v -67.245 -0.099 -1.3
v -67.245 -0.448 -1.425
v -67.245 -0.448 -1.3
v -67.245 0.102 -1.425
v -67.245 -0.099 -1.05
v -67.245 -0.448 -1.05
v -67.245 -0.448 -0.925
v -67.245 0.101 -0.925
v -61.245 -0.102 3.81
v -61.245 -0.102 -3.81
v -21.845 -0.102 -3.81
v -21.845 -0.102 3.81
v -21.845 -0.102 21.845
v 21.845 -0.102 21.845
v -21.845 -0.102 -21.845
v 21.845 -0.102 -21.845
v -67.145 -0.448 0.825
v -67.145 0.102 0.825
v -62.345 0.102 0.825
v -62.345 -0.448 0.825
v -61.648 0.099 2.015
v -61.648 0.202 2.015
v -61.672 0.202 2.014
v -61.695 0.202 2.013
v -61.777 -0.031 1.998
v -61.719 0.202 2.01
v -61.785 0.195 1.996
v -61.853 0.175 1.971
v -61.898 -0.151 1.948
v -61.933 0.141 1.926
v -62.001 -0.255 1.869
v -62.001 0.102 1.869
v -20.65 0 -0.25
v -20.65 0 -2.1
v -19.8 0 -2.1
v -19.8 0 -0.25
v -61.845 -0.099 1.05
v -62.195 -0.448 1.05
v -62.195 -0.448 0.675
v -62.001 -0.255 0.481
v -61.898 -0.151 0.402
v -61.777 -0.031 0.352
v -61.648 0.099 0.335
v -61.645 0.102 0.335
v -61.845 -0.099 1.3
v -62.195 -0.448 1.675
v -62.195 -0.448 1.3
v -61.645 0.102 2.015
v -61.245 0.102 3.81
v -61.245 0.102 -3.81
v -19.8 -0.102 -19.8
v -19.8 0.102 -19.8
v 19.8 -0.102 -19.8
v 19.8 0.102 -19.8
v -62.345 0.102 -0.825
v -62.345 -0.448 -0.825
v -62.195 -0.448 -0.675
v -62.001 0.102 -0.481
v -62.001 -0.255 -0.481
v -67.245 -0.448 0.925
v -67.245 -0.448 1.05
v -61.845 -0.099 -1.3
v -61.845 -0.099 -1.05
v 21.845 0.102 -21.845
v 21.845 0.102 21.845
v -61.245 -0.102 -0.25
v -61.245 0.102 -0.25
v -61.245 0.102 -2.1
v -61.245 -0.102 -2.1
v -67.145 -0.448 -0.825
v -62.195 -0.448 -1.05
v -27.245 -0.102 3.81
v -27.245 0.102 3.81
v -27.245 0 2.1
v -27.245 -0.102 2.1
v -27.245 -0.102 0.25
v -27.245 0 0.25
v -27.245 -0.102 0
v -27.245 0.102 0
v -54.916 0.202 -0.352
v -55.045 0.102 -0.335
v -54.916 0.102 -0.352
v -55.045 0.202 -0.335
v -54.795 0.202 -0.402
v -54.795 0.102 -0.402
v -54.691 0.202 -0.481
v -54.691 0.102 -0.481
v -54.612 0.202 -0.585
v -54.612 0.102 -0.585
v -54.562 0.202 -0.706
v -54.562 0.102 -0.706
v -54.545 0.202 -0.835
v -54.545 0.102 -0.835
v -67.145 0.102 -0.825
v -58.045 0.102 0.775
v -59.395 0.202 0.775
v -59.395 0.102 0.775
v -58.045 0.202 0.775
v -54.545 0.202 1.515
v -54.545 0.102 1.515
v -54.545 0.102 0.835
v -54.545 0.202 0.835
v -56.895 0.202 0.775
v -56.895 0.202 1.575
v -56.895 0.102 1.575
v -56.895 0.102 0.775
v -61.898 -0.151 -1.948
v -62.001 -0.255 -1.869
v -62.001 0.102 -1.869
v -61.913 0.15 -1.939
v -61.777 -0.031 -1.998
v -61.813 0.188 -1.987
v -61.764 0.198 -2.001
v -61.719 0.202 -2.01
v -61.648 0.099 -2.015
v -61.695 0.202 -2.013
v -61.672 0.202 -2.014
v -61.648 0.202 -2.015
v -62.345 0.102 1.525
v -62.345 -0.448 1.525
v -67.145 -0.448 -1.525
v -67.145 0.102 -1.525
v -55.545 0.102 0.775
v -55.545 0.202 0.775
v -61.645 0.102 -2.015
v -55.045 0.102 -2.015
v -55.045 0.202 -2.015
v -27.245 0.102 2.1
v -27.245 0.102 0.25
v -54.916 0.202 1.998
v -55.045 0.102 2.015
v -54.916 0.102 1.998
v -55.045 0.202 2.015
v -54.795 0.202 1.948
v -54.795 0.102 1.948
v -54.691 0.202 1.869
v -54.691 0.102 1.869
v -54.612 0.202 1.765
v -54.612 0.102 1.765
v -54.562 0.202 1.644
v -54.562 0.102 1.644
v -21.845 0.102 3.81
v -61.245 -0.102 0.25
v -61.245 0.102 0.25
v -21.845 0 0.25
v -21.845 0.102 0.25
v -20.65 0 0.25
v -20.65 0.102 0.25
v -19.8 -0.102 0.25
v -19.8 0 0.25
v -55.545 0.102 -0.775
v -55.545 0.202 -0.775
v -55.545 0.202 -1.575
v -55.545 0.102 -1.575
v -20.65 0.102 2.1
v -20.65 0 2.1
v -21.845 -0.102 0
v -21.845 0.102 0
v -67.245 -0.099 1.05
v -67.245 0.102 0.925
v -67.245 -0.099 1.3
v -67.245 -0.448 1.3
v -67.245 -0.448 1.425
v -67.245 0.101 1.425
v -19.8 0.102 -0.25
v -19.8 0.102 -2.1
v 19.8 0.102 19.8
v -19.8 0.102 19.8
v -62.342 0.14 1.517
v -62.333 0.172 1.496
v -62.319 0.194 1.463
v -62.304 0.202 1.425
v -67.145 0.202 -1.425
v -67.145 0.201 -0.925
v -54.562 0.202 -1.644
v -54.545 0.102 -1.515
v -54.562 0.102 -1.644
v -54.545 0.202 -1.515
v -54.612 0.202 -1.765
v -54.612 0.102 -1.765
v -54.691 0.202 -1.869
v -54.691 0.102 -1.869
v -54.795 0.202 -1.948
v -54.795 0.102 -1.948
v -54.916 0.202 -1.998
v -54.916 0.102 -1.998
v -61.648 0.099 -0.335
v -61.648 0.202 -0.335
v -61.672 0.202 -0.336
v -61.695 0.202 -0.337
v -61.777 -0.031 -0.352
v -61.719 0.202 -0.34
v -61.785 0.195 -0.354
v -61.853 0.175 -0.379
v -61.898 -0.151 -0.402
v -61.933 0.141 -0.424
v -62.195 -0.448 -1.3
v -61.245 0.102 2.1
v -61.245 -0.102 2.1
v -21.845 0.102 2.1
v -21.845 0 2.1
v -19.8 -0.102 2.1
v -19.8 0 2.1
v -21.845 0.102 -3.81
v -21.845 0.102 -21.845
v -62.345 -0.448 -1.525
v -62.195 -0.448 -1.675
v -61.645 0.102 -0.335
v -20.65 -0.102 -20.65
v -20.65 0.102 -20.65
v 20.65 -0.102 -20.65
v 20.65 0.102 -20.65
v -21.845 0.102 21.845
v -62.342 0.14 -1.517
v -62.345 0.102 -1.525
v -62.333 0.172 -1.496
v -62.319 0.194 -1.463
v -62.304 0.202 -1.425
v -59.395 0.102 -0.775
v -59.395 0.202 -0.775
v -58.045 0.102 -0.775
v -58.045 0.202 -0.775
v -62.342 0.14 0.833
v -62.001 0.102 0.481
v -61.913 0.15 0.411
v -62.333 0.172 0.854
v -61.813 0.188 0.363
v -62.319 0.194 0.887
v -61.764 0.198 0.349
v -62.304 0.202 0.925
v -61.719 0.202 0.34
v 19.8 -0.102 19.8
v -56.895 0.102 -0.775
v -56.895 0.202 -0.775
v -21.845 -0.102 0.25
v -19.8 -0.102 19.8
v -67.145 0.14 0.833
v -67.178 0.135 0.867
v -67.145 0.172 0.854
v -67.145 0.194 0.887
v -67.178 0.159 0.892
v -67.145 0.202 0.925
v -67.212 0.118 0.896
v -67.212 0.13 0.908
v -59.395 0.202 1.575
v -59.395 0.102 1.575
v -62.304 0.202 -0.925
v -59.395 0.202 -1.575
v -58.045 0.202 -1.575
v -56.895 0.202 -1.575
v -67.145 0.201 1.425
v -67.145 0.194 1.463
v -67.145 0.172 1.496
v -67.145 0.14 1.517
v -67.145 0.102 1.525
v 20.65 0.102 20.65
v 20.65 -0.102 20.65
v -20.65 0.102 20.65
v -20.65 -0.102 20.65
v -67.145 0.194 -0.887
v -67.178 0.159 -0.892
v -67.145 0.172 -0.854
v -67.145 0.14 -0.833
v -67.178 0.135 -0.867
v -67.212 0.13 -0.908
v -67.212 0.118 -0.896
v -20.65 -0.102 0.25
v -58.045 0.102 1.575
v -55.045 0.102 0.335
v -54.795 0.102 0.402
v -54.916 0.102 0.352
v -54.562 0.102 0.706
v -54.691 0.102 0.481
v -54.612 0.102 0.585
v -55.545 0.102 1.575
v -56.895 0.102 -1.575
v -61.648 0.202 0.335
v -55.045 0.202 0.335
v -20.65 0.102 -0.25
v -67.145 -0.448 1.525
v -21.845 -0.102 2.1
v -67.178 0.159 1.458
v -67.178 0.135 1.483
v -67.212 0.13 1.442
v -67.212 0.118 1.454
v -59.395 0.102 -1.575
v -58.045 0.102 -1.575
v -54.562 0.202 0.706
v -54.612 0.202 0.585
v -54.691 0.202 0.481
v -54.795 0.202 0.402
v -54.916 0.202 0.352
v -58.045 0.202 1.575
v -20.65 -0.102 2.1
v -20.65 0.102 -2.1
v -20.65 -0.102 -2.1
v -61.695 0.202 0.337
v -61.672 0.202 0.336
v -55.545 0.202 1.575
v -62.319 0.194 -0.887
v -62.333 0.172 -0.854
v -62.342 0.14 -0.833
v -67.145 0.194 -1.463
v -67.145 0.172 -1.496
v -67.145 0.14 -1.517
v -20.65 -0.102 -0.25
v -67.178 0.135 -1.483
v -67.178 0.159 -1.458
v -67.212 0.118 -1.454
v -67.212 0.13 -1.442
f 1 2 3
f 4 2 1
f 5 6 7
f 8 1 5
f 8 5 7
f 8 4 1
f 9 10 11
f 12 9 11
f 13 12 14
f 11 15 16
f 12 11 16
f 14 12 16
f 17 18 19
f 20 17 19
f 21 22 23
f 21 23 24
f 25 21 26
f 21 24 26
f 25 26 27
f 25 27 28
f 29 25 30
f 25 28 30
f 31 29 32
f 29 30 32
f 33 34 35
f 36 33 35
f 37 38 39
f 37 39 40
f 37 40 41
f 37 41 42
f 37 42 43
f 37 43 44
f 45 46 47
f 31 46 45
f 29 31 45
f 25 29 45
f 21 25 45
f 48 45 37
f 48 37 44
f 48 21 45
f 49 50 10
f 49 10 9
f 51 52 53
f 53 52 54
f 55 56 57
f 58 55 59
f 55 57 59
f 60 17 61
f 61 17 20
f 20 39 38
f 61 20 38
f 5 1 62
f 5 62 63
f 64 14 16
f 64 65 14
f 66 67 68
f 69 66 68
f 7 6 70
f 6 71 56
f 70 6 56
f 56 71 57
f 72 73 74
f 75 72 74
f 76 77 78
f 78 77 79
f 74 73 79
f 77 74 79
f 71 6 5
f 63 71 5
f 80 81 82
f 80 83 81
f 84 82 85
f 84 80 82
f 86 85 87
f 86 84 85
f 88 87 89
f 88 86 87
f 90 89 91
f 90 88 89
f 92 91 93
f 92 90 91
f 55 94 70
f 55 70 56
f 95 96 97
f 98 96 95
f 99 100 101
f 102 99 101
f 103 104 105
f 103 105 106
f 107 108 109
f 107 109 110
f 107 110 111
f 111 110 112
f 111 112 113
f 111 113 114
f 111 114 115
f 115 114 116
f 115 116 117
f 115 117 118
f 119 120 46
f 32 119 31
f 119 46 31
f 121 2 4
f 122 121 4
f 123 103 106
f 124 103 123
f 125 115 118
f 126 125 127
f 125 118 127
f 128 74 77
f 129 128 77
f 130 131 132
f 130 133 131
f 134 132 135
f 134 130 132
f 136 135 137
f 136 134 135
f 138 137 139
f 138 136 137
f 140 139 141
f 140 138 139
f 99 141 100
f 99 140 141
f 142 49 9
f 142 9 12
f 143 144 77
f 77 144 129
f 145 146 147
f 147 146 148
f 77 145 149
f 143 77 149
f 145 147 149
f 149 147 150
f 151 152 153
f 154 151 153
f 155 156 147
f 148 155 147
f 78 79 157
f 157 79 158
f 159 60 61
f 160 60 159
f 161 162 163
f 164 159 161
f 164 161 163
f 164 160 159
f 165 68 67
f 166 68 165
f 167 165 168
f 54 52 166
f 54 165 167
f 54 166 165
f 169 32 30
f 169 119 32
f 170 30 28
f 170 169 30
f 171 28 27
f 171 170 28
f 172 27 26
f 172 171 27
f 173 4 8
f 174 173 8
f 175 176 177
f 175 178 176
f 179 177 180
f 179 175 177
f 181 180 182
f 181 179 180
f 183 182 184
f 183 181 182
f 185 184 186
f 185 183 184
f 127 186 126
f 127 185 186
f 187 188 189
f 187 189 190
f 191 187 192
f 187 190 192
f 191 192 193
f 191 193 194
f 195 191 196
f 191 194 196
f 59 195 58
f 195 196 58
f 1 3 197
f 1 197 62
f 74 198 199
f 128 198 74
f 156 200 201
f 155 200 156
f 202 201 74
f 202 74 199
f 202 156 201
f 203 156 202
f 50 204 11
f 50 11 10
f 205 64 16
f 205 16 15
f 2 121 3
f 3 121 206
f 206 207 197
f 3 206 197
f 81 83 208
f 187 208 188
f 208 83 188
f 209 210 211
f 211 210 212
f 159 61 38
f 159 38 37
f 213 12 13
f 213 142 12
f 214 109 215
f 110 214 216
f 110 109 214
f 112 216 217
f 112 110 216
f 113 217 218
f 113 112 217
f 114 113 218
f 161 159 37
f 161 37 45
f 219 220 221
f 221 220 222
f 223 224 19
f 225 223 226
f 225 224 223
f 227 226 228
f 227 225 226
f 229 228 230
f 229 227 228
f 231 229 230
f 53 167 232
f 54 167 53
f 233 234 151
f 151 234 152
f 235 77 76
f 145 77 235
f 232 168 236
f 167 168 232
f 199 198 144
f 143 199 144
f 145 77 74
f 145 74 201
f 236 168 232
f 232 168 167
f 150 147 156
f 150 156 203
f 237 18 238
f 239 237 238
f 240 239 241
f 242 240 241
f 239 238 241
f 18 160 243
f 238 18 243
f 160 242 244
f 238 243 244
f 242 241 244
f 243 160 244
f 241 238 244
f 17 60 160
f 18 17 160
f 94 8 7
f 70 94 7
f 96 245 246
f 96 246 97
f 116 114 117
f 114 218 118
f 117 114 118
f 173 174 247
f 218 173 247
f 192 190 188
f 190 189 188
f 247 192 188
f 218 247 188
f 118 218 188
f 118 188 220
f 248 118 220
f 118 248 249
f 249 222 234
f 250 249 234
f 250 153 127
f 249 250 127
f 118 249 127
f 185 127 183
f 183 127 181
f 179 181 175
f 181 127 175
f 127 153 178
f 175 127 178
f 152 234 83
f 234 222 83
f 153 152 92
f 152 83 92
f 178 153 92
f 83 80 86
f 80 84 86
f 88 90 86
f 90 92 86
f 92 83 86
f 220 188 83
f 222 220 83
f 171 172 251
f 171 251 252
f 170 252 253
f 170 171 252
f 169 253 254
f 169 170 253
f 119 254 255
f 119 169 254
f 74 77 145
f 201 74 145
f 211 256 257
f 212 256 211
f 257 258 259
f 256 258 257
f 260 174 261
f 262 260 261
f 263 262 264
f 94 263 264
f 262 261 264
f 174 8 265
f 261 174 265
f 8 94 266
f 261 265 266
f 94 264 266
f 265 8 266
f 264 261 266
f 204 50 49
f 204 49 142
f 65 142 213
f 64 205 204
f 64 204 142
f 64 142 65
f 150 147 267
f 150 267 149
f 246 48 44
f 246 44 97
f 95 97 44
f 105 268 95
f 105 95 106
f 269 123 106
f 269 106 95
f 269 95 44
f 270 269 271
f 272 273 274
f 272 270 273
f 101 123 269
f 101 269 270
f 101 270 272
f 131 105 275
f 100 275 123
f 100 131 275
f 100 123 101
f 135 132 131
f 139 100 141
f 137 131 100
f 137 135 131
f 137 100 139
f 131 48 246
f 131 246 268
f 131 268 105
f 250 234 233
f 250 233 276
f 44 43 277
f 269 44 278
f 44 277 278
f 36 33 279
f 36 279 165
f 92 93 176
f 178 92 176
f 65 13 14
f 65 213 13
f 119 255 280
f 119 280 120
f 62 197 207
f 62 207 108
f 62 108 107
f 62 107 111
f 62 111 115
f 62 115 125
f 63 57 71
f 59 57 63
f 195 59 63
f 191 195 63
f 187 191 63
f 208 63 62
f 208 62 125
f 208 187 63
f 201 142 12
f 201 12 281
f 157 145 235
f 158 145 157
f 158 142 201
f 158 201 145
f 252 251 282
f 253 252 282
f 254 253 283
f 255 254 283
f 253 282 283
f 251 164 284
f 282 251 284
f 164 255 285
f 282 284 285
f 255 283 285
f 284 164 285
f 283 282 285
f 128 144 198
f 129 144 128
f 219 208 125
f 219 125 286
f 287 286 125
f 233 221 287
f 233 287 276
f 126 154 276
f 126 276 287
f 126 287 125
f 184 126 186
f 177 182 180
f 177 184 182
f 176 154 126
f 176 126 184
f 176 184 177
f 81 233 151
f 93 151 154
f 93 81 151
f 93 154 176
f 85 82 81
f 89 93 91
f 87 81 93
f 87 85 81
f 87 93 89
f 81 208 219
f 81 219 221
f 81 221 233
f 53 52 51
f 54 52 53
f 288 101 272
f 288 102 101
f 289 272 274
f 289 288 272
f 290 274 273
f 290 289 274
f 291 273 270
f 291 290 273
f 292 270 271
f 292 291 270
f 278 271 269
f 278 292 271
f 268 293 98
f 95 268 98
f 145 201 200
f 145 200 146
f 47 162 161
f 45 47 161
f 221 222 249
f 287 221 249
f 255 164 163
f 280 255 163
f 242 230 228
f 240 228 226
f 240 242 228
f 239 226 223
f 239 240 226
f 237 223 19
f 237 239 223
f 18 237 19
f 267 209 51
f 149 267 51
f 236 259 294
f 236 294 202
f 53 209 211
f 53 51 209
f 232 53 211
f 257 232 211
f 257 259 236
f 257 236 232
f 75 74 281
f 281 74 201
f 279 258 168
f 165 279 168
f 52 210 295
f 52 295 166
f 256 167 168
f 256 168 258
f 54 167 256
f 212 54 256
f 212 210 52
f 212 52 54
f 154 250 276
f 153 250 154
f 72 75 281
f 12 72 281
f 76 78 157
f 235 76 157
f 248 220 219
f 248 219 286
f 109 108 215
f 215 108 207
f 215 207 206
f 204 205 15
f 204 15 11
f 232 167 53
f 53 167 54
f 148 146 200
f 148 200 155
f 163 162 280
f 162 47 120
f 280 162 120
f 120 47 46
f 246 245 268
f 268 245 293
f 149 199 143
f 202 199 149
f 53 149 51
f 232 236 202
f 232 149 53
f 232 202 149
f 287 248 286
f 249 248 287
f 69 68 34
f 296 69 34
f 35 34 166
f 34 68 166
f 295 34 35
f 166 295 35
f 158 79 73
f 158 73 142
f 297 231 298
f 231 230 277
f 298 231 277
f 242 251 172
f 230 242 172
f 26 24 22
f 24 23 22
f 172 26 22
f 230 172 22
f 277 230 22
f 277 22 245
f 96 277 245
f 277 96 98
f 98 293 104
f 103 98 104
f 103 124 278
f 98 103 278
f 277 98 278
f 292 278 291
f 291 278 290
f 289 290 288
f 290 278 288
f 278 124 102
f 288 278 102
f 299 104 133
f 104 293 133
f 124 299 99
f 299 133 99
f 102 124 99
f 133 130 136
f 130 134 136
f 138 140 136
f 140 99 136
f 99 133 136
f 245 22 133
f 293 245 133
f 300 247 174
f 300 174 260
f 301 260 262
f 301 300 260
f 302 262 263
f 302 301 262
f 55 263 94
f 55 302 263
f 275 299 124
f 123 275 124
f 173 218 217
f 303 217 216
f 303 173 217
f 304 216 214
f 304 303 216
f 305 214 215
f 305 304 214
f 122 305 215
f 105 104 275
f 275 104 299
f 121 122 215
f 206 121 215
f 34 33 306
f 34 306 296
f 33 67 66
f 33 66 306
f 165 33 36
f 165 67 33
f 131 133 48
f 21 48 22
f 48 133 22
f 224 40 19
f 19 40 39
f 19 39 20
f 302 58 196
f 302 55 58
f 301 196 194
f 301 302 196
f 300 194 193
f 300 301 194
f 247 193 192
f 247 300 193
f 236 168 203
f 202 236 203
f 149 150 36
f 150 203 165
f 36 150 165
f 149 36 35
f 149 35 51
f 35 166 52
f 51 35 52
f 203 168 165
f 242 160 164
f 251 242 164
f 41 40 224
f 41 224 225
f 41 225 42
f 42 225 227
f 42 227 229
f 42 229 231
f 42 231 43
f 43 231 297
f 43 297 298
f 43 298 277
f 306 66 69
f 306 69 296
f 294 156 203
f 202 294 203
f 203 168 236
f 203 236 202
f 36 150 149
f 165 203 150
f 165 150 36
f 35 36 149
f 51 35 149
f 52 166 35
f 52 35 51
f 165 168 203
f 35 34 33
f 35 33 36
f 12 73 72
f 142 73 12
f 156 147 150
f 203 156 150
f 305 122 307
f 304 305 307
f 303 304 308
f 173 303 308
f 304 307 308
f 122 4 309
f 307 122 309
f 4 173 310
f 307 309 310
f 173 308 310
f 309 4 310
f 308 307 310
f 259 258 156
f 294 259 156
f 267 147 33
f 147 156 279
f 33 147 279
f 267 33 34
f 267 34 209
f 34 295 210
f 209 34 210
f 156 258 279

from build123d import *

# Parameters (mm, degrees)
BOSS_EXTRUDE1_DEPTH             = 0.1015
SKETCH4_W                       = 39.6
SKETCH4_H                       = 39.6
BOSS_EXTRUDE2_DEPTH             = 0.1015
BOSS_EXTRUDE4_REACH             = 67.024
SKETCH6_W                       = 41.445
SKETCH6_H                       = 1.85
BOSS_EXTRUDE4_DIRECTION_2_REACH = 67.024
BOSS_EXTRUDE3_REACH             = 67.024
SKETCH5_W                       = 41.3
SKETCH5_H                       = 41.3
SKETCH5_W_2                     = 39.6
SKETCH5_H_2                     = 39.6
BOSS_EXTRUDE3_DIRECTION_2_REACH = 67.024
SKETCH12_W                      = 0.85
SKETCH12_H                      = 1.85
CUT_EXTRUDE2_DEPTH              = 66.024336615
SKETCH12_2_W                    = 0.85
SKETCH12_2_H                    = 1.85
CUT_EXTRUDE7_DEPTH              = 66.024336615
SKETCH14_W                      = 0.85
SKETCH14_H                      = 1.85
CUT_EXTRUDE4_DEPTH              = 66.024336615
SKETCH14_2_W                    = 0.85
SKETCH14_2_H                    = 1.85
CUT_EXTRUDE8_DEPTH              = 66.024336615
BOSS_EXTRUDE5_DEPTH             = 0.1
SKETCH29_W                      = 5
SKETCH29_H                      = 0.7
BOSS_EXTRUDE6_DEPTH             = 0.55
CHAMFER1_SIZE                   = 0.6
CHAMFER2_SIZE                   = 0.6
SKETCH30_W                      = 0.25
SKETCH30_H                      = 0.35
CUT_EXTRUDE_THIN1_DEPTH         = 92.730220087
FILLET2_R                       = 0.1
CHAMFER3_SIZE                   = 0.1
FILLET4_R                       = 0.5
FILLET5_R                       = 0.5
SKETCH31_W                      = 1.35
SKETCH31_H                      = 0.8
CUT_EXTRUDE6_DEPTH              = 0.1
LPATTERN3_COUNT                 = 2
LPATTERN3_PITCH                 = 2.35
SKETCH32_W                      = 5.4
SKETCH32_H                      = 3.81
BOSS_EXTRUDE7_DEPTH             = 0.203
SKETCH33_W                      = 5.4
SKETCH33_H                      = 1.85
CUT_EXTRUDE9_DEPTH              = 71.70569427
SKETCH33_2_W                    = 5.4
SKETCH33_2_H                    = 1.85
CUT_EXTRUDE10_DEPTH             = 71.70569427


with BuildPart() as part:
    # Sketch3 → Boss-Extrude1 (new, symmetric)
    with BuildSketch(Plane(origin=(0, 0, 0), x_dir=(1, 0, 0), z_dir=(0, 1, 0))):
        Polygon((21.845, -21.845), (21.845, 21.845), (-21.845, 21.845), (-21.845, 3.81), (-54.745, 3.81), (-61.245, 3.81), (-61.245, -3.81), (-54.745, -3.81), (-21.845, -3.81), (-21.845, -21.845), align=None)
    extrude(amount=BOSS_EXTRUDE1_DEPTH, both=True)


with BuildPart() as body_2:
    # Sketch4 → Boss-Extrude2 (new, symmetric)
    with BuildSketch(Plane(origin=(0, 0, 0), x_dir=(1, 0, 0), z_dir=(0, 1, 0))):
        Rectangle(SKETCH4_W, SKETCH4_H)
    extrude(amount=BOSS_EXTRUDE2_DEPTH, both=True)


    # Boss-Extrude4: up to this face of the body (flat: up to its plane)
    boss_extrude4_end = Plane(part.part.faces().sort_by_distance((-5.646321076, 0.1015, 0))[0])
    # Sketch6 → Boss-Extrude4 (add, up to the picked face)
    with BuildSketch(Plane(origin=(0, 0, 0), x_dir=(1, 0, 0), z_dir=(0, 1, 0)), mode=Mode.PRIVATE) as boss_extrude4_sk1:
        with Locations((-40.5225, -1.175)):
            Rectangle(SKETCH6_W, SKETCH6_H)
    boss_extrude4_tool1 = split(extrude(boss_extrude4_sk1.sketch, amount=BOSS_EXTRUDE4_REACH, mode=Mode.PRIVATE), bisect_by=boss_extrude4_end, keep=Keep.BOTH, mode=Mode.PRIVATE)
    # Sketch6 → Boss-Extrude4 (add, up to the picked face)
    with BuildSketch(Plane(origin=(0, 0, 0), x_dir=(1, 0, 0), z_dir=(0, 1, 0)), mode=Mode.PRIVATE) as boss_extrude4_sk2:
        with Locations((-40.5225, 1.175)):
            Rectangle(SKETCH6_W, SKETCH6_H)
    boss_extrude4_tool2 = split(extrude(boss_extrude4_sk2.sketch, amount=BOSS_EXTRUDE4_REACH, mode=Mode.PRIVATE), bisect_by=boss_extrude4_end, keep=Keep.BOTH, mode=Mode.PRIVATE)
    add(boss_extrude4_tool1.solids().sort_by(Axis((-40.5225, 0, 1.175), (0, 1, 0)))[0])
    add(boss_extrude4_tool2.solids().sort_by(Axis((-40.5225, 0, -1.175), (0, 1, 0)))[0])


    # Boss-Extrude4 direction 2: up to this face of the body (flat: up to its plane)
    boss_extrude4_direction_2_end = Plane(part.part.faces().sort_by_distance((-5.646321076, -0.1015, 0))[0])
    # Sketch6 → Boss-Extrude4 direction 2 (add, up to the picked face)
    with BuildSketch(Plane(origin=(0, 0, 0), x_dir=(1, 0, 0), z_dir=(0, 1, 0)), mode=Mode.PRIVATE) as boss_extrude4_direction_2_sk1:
        with Locations((-40.5225, -1.175)):
            Rectangle(SKETCH6_W, SKETCH6_H)
    boss_extrude4_direction_2_tool1 = split(extrude(boss_extrude4_direction_2_sk1.sketch, amount=-BOSS_EXTRUDE4_DIRECTION_2_REACH, mode=Mode.PRIVATE), bisect_by=boss_extrude4_direction_2_end, keep=Keep.BOTH, mode=Mode.PRIVATE)
    # Sketch6 → Boss-Extrude4 direction 2 (add, up to the picked face)
    with BuildSketch(Plane(origin=(0, 0, 0), x_dir=(1, 0, 0), z_dir=(0, 1, 0)), mode=Mode.PRIVATE) as boss_extrude4_direction_2_sk2:
        with Locations((-40.5225, 1.175)):
            Rectangle(SKETCH6_W, SKETCH6_H)
    boss_extrude4_direction_2_tool2 = split(extrude(boss_extrude4_direction_2_sk2.sketch, amount=-BOSS_EXTRUDE4_DIRECTION_2_REACH, mode=Mode.PRIVATE), bisect_by=boss_extrude4_direction_2_end, keep=Keep.BOTH, mode=Mode.PRIVATE)
    add(boss_extrude4_direction_2_tool1.solids().sort_by(Axis((-40.5225, 0, 1.175), (0, -1, 0)))[0])
    add(boss_extrude4_direction_2_tool2.solids().sort_by(Axis((-40.5225, 0, -1.175), (0, -1, 0)))[0])

    # Sketch12 → Cut-Extrude2 (cut, through all)
    with BuildSketch(Plane(origin=(0, 0, 0), x_dir=(1, 0, 0), z_dir=(0, 1, 0))):
        with Locations((-20.225, -1.175)):
            Rectangle(SKETCH12_W, SKETCH12_H)
    extrude(amount=CUT_EXTRUDE2_DEPTH, mode=Mode.SUBTRACT)

    # Sketch14<2> → Cut-Extrude8 (cut, through all)
    with BuildSketch(Plane(origin=(0, 0, 0), x_dir=(1, 0, 0), z_dir=(0, 1, 0))):
        with Locations((-20.225, 1.175)):
            Rectangle(SKETCH14_2_W, SKETCH14_2_H)
    extrude(amount=-CUT_EXTRUDE8_DEPTH, mode=Mode.SUBTRACT)

    # Sketch33<2> → Cut-Extrude10 (cut, through all)
    with BuildSketch(Plane(origin=(0, 0, 0), x_dir=(1, 0, 0), z_dir=(0, 1, 0))):
        with Locations((-24.545, -1.175)):
            Rectangle(SKETCH33_2_W, SKETCH33_2_H)
    extrude(amount=CUT_EXTRUDE10_DEPTH, mode=Mode.SUBTRACT)


with BuildPart() as body_3:

    # Boss-Extrude3: up to this face of the body (flat: up to its plane)
    boss_extrude3_end = Plane(part.part.faces().sort_by_distance((-5.646321076, 0.1015, 0))[0])
    # Sketch5 → Boss-Extrude3 (new, up to the picked face)
    with BuildSketch(Plane(origin=(0, 0, 0), x_dir=(1, 0, 0), z_dir=(0, 1, 0)), mode=Mode.PRIVATE) as boss_extrude3_sk1:
        Rectangle(SKETCH5_W, SKETCH5_H)
        Rectangle(SKETCH5_W_2, SKETCH5_H_2, mode=Mode.SUBTRACT)
    boss_extrude3_tool1 = split(extrude(boss_extrude3_sk1.sketch, amount=BOSS_EXTRUDE3_REACH, mode=Mode.PRIVATE), bisect_by=boss_extrude3_end, keep=Keep.BOTH, mode=Mode.PRIVATE)
    add(boss_extrude3_tool1.solids().sort_by(Axis((0, 0, 20.06593), (0, 1, 0)))[0])


    # Boss-Extrude3 direction 2: up to this face of the body (flat: up to its plane)
    boss_extrude3_direction_2_end = Plane(part.part.faces().sort_by_distance((-5.646321076, -0.1015, 0))[0])
    # Sketch5 → Boss-Extrude3 direction 2 (add, up to the picked face)
    with BuildSketch(Plane(origin=(0, 0, 0), x_dir=(1, 0, 0), z_dir=(0, 1, 0)), mode=Mode.PRIVATE) as boss_extrude3_direction_2_sk1:
        Rectangle(SKETCH5_W, SKETCH5_H)
        Rectangle(SKETCH5_W_2, SKETCH5_H_2, mode=Mode.SUBTRACT)
    boss_extrude3_direction_2_tool1 = split(extrude(boss_extrude3_direction_2_sk1.sketch, amount=-BOSS_EXTRUDE3_DIRECTION_2_REACH, mode=Mode.PRIVATE), bisect_by=boss_extrude3_direction_2_end, keep=Keep.BOTH, mode=Mode.PRIVATE)
    add(boss_extrude3_direction_2_tool1.solids().sort_by(Axis((0, 0, 20.06593), (0, -1, 0)))[0])

    # Sketch12<2> → Cut-Extrude7 (cut, through all)
    with BuildSketch(Plane(origin=(0, 0, 0), x_dir=(1, 0, 0), z_dir=(0, 1, 0))):
        with Locations((-20.225, -1.175)):
            Rectangle(SKETCH12_2_W, SKETCH12_2_H)
    extrude(amount=-CUT_EXTRUDE7_DEPTH, mode=Mode.SUBTRACT)

    # Sketch14 → Cut-Extrude4 (cut, through all)
    with BuildSketch(Plane(origin=(0, 0, 0), x_dir=(1, 0, 0), z_dir=(0, 1, 0))):
        with Locations((-20.225, 1.175)):
            Rectangle(SKETCH14_W, SKETCH14_H)
    extrude(amount=CUT_EXTRUDE4_DEPTH, mode=Mode.SUBTRACT)


with BuildPart() as body_4:
    # Sketch28 → Boss-Extrude5 (new body)
    with BuildSketch(Plane(origin=(0, 0.1015, 0), x_dir=(1, 0, 0), z_dir=(0, 1, 0))):
        Polygon((-61.745, 0.335), (-54.545, 0.335), (-54.545, 2.015), (-61.745, 2.015), (-61.745, 1.525), (-67.245, 1.525), (-67.245, 0.825), (-61.745, 0.825), align=None)
    extrude(amount=BOSS_EXTRUDE5_DEPTH)

    # Sketch29 → Boss-Extrude6 (add)
    with BuildSketch(Plane.XZ.offset(-0.1015)):
        with Locations((-64.745, -1.175)):
            Rectangle(SKETCH29_W, SKETCH29_H)
    extrude(amount=BOSS_EXTRUDE6_DEPTH)

    # Chamfer1
    # the kernel refuses this chamfer: 0.6 mm, written as the material it adds along each edge
    with BuildSketch(Plane(origin=(-61.745, -1.441509793, -0.825), x_dir=(-0.9996219169112968, 0, -0.027495876610586265), z_dir=(0, 1, 0))) as chamfer1_piece_1_section:
        Polygon((CHAMFER1_SIZE * 0.999621916911, CHAMFER1_SIZE * 0.0274958766106), (-CHAMFER1_SIZE * 0.0274958766106, CHAMFER1_SIZE * 0.999621916911), (0, 0), align=None)
    chamfer1_piece_1 = extrude(amount=1.643009793, mode=Mode.PRIVATE)
    chamfer1_piece_1 = split(chamfer1_piece_1, bisect_by=Plane(origin=(-62.287471069, 0.1015, -0.807931278), z_dir=(0, -1, 0)), keep=Keep.TOP, mode=Mode.PRIVATE)
    chamfer1_piece_1 = split(chamfer1_piece_1, bisect_by=Plane(origin=(-62.245, -0.1735, -0.807931278), z_dir=(-1, 0, 0)), keep=Keep.TOP, mode=Mode.PRIVATE)
    chamfer1_piece_1 = split(chamfer1_piece_1, bisect_by=Plane(origin=(-62.287471069, -0.4485, -0.807931278), z_dir=(0, 1, 0)), keep=Keep.TOP, mode=Mode.PRIVATE)
    add(chamfer1_piece_1)
    with BuildSketch(Plane(origin=(-61.745, 0.1015, -0.825), x_dir=(-0.9996219169112968, 0, -0.027495876610586265), z_dir=(0, 1, 0))) as chamfer1_piece_2_section:
        Polygon((CHAMFER1_SIZE * 0.999621916911, CHAMFER1_SIZE * 0.0274958766106), (-CHAMFER1_SIZE * 0.0274958766106, CHAMFER1_SIZE * 0.999621916911), (0, 0), align=None)
    chamfer1_piece_2 = extrude(amount=0.1, mode=Mode.PRIVATE)
    chamfer1_piece_2 = split(chamfer1_piece_2, bisect_by=Plane(origin=(-62.245, 0.1515, -0.807931278), z_dir=(-1, 0, 0)), keep=Keep.TOP, mode=Mode.PRIVATE)
    add(chamfer1_piece_2)
    with BuildSketch(Plane(origin=(-61.745, 0.1015, -0.825), x_dir=(-0.9996219169112968, 0, -0.027495876610586265), z_dir=(0, 1, 0))) as chamfer1_piece_3_section:
        Polygon((CHAMFER1_SIZE * 0.999621916911, CHAMFER1_SIZE * 0.0274958766106), (-CHAMFER1_SIZE * 0.0274958766106, CHAMFER1_SIZE * 0.999621916911), (0, 0), align=None)
    chamfer1_piece_3 = extrude(amount=0.1, mode=Mode.PRIVATE)
    chamfer1_piece_3 = split(chamfer1_piece_3, bisect_by=Plane(origin=(-61.936971503, 0.1515, -0.335), z_dir=(0, 0, -1)), keep=Keep.TOP, mode=Mode.PRIVATE)
    chamfer1_piece_3 = split(chamfer1_piece_3, bisect_by=Plane(origin=(-62.245, 0.1515, -0.636152833), z_dir=(1, 0, 0)), keep=Keep.TOP, mode=Mode.PRIVATE)
    add(chamfer1_piece_3)
    with BuildSketch(Plane(origin=(-61.745, -1.441509793, -1.525), x_dir=(-0.9996219169112968, 0, 0.027495876610586265), z_dir=(0, 1, 0))) as chamfer1_piece_4_section:
        Polygon((CHAMFER1_SIZE * 0.999621916911, -CHAMFER1_SIZE * 0.0274958766106), (-CHAMFER1_SIZE * 0.0274958766106, -CHAMFER1_SIZE * 0.999621916911), (0, 0), align=None)
    chamfer1_piece_4 = extrude(amount=1.643009793, mode=Mode.PRIVATE)
    chamfer1_piece_4 = split(chamfer1_piece_4, bisect_by=Plane(origin=(-62.287471069, -0.4485, -1.542068722), z_dir=(0, 1, 0)), keep=Keep.TOP, mode=Mode.PRIVATE)
    chamfer1_piece_4 = split(chamfer1_piece_4, bisect_by=Plane(origin=(-62.245, -0.1735, -1.542068722), z_dir=(-1, 0, 0)), keep=Keep.TOP, mode=Mode.PRIVATE)
    chamfer1_piece_4 = split(chamfer1_piece_4, bisect_by=Plane(origin=(-62.287471069, 0.1015, -1.542068722), z_dir=(0, -1, 0)), keep=Keep.TOP, mode=Mode.PRIVATE)
    add(chamfer1_piece_4)
    with BuildSketch(Plane(origin=(-61.745, 0.1015, -1.525), x_dir=(-0.9996219169112968, 0, 0.027495876610586265), z_dir=(0, 1, 0))) as chamfer1_piece_5_section:
        Polygon((CHAMFER1_SIZE * 0.999621916911, -CHAMFER1_SIZE * 0.0274958766106), (-CHAMFER1_SIZE * 0.0274958766106, -CHAMFER1_SIZE * 0.999621916911), (0, 0), align=None)
    chamfer1_piece_5 = extrude(amount=0.1, mode=Mode.PRIVATE)
    chamfer1_piece_5 = split(chamfer1_piece_5, bisect_by=Plane(origin=(-62.245, 0.1515, -1.542068722), z_dir=(-1, 0, 0)), keep=Keep.TOP, mode=Mode.PRIVATE)
    add(chamfer1_piece_5)
    with BuildSketch(Plane(origin=(-61.745, 0.1015, -1.525), x_dir=(-0.9996219169112968, 0, 0.027495876610586265), z_dir=(0, 1, 0))) as chamfer1_piece_6_section:
        Polygon((CHAMFER1_SIZE * 0.999621916911, -CHAMFER1_SIZE * 0.0274958766106), (-CHAMFER1_SIZE * 0.0274958766106, -CHAMFER1_SIZE * 0.999621916911), (0, 0), align=None)
    chamfer1_piece_6 = extrude(amount=0.1, mode=Mode.PRIVATE)
    chamfer1_piece_6 = split(chamfer1_piece_6, bisect_by=Plane(origin=(-62.245, 0.1515, -1.713847167), z_dir=(1, 0, 0)), keep=Keep.TOP, mode=Mode.PRIVATE)
    chamfer1_piece_6 = split(chamfer1_piece_6, bisect_by=Plane(origin=(-61.936971503, 0.1515, -2.015), z_dir=(0, 0, 1)), keep=Keep.TOP, mode=Mode.PRIVATE)
    add(chamfer1_piece_6)

    # Chamfer2
    # the kernel refuses this chamfer: 0.6 mm, written as the material it adds along each edge
    with BuildSketch(Plane(origin=(-62.245, 0.1015, 0.818009793), x_dir=(-0.027495876610584478, -0.9996219169112968, 0), z_dir=(0, 0, -1))) as chamfer2_piece_1_section:
        Polygon((CHAMFER2_SIZE * 0.999621916911, -CHAMFER2_SIZE * 0.0274958766106), (-CHAMFER2_SIZE * 0.0274958766106, -CHAMFER2_SIZE * 0.999621916911), (0, 0), align=None)
    chamfer2_piece_1 = extrude(amount=3.986019586, mode=Mode.PRIVATE)
    chamfer2_piece_1 = split(chamfer2_piece_1, bisect_by=Plane(origin=(-62.354551126, -0.075864329, -1.515448874), z_dir=(0.7071067811868302, 0, 0.7071067811862649)), keep=Keep.TOP, mode=Mode.PRIVATE)
    chamfer2_piece_1 = split(chamfer2_piece_1, bisect_by=Plane(origin=(-62.014102253, -0.075864329, -2.015), z_dir=(0, 0, 1)), keep=Keep.TOP, mode=Mode.PRIVATE)
    chamfer2_piece_1 = split(chamfer2_piece_1, bisect_by=Plane(origin=(-62.014102253, -0.075864329, -0.335), z_dir=(0, 0, -1)), keep=Keep.TOP, mode=Mode.PRIVATE)
    chamfer2_piece_1 = split(chamfer2_piece_1, bisect_by=Plane(origin=(-62.354551126, -0.075864329, -0.834551126), z_dir=(0.7071067811868302, 0, -0.7071067811862649)), keep=Keep.TOP, mode=Mode.PRIVATE)
    chamfer2_piece_1 = split(chamfer2_piece_1, bisect_by=Plane(origin=(-62.014102253, -0.4485, -1.175), z_dir=(0, 1, 0)), keep=Keep.TOP, mode=Mode.PRIVATE)
    add(chamfer2_piece_1)

    # Sketch30 → Cut-Extrude-Thin1 (cut, through all)
    with BuildSketch(Plane.ZY.offset(67.245)):
        with Locations((-1.175, -0.2735)):
            Rectangle(SKETCH30_W, SKETCH30_H)
    extrude(amount=-CUT_EXTRUDE_THIN1_DEPTH, mode=Mode.SUBTRACT)

    # Fillet2
    fillet2_edges = [body_4.edges().sort_by_distance(p)[0] for p in [
        (-62.1, 0.2015, -1.77),
        (-62.1, 0.2015, -0.58),
        (-64.795, 0.2015, -0.825),
        (-64.795, 0.2015, -1.525),
    ]]
    fillet(fillet2_edges, radius=FILLET2_R)

    # Chamfer3
    chamfer3_edges = [body_4.edges().sort_by_distance(p)[0] for p in [
        (-67.245, 0.2015, -1.175),
        (-67.245, -0.1735, -0.825),
        (-67.245, -0.1735, -1.525),
        (-67.245, 0.172210678, -1.495710678),
        (-67.245, 0.172210678, -0.854289322),
    ]]
    chamfer(chamfer3_edges, length=CHAMFER3_SIZE)

    # Fillet4
    # the kernel refuses this fillet: 0.5 mm, written as the material it takes off along each edge
    with BuildSketch(Plane(origin=(-61.855, 0.619266953, -2.015), x_dir=(1, 0, 0), z_dir=(0, -1, 0))) as fillet4_piece_1:
        with BuildLine():
            CenterArc((FILLET4_R * 0.414213562374, FILLET4_R), FILLET4_R, 225, 45)
            Line((-FILLET4_R * 0.292893218814, FILLET4_R * 0.292893218814), (0, 0))
            Line((0, 0), (FILLET4_R * 0.414213562374, 0))
        make_face()
    extrude(amount=1.245533906, mode=Mode.SUBTRACT)
    with BuildSketch(Plane(origin=(-61.855, 0.619266953, -0.335), x_dir=(1, 0, 0), z_dir=(0, -1, 0))) as fillet4_piece_2:
        with BuildLine():
            CenterArc((FILLET4_R * 0.414213562374, -FILLET4_R), FILLET4_R, 90, 45)
            Line((-FILLET4_R * 0.292893218814, -FILLET4_R * 0.292893218814), (0, 0))
            Line((0, 0), (FILLET4_R * 0.414213562374, 0))
        make_face()
    extrude(amount=1.245533906, mode=Mode.SUBTRACT)

    # Fillet5
    fillet5_edges = [body_4.edges().sort_by_distance(p)[0] for p in [
        (-54.545, 0.1515, -0.335),
        (-54.545, 0.1515, -2.015),
    ]]
    fillet(fillet5_edges, radius=FILLET5_R)

    # Sketch31 → Cut-Extrude6 (cut)
    with BuildSketch(Plane(origin=(0, 0.2015, 0), x_dir=(1, 0, 0), z_dir=(0, 1, 0))):
        with Locations((-56.22, 1.175)):
            Rectangle(SKETCH31_W, SKETCH31_H)
        with Locations((-58.72, 1.175)):
            Rectangle(SKETCH31_W, SKETCH31_H)
    extrude(amount=-CUT_EXTRUDE6_DEPTH, mode=Mode.SUBTRACT)


with BuildPart() as lpattern3_1:
    # LPattern3: pattern copy
    add(body_4.part.moved(Location(Vector(0, 0, 1) * (1 * LPATTERN3_PITCH))))


with BuildPart() as body_6:
    # Sketch32 → Boss-Extrude7 (new body)
    with BuildSketch(Plane(origin=(0, 0.1015, 0), x_dir=(1, 0, 0), z_dir=(0, 1, 0))):
        with Locations((-24.545, -1.905)):
            Rectangle(SKETCH32_W, SKETCH32_H)
    extrude(amount=-BOSS_EXTRUDE7_DEPTH)

    # Sketch33 → Cut-Extrude9 (cut, through all)
    with BuildSketch(Plane(origin=(0, 0, 0), x_dir=(1, 0, 0), z_dir=(0, 1, 0))):
        with Locations((-24.545, -1.175)):
            Rectangle(SKETCH33_W, SKETCH33_H)
    extrude(amount=-CUT_EXTRUDE9_DEPTH, mode=Mode.SUBTRACT)


solid = Compound([part.part, body_2.part, body_3.part, body_4.part, lpattern3_1.part, body_6.part])
